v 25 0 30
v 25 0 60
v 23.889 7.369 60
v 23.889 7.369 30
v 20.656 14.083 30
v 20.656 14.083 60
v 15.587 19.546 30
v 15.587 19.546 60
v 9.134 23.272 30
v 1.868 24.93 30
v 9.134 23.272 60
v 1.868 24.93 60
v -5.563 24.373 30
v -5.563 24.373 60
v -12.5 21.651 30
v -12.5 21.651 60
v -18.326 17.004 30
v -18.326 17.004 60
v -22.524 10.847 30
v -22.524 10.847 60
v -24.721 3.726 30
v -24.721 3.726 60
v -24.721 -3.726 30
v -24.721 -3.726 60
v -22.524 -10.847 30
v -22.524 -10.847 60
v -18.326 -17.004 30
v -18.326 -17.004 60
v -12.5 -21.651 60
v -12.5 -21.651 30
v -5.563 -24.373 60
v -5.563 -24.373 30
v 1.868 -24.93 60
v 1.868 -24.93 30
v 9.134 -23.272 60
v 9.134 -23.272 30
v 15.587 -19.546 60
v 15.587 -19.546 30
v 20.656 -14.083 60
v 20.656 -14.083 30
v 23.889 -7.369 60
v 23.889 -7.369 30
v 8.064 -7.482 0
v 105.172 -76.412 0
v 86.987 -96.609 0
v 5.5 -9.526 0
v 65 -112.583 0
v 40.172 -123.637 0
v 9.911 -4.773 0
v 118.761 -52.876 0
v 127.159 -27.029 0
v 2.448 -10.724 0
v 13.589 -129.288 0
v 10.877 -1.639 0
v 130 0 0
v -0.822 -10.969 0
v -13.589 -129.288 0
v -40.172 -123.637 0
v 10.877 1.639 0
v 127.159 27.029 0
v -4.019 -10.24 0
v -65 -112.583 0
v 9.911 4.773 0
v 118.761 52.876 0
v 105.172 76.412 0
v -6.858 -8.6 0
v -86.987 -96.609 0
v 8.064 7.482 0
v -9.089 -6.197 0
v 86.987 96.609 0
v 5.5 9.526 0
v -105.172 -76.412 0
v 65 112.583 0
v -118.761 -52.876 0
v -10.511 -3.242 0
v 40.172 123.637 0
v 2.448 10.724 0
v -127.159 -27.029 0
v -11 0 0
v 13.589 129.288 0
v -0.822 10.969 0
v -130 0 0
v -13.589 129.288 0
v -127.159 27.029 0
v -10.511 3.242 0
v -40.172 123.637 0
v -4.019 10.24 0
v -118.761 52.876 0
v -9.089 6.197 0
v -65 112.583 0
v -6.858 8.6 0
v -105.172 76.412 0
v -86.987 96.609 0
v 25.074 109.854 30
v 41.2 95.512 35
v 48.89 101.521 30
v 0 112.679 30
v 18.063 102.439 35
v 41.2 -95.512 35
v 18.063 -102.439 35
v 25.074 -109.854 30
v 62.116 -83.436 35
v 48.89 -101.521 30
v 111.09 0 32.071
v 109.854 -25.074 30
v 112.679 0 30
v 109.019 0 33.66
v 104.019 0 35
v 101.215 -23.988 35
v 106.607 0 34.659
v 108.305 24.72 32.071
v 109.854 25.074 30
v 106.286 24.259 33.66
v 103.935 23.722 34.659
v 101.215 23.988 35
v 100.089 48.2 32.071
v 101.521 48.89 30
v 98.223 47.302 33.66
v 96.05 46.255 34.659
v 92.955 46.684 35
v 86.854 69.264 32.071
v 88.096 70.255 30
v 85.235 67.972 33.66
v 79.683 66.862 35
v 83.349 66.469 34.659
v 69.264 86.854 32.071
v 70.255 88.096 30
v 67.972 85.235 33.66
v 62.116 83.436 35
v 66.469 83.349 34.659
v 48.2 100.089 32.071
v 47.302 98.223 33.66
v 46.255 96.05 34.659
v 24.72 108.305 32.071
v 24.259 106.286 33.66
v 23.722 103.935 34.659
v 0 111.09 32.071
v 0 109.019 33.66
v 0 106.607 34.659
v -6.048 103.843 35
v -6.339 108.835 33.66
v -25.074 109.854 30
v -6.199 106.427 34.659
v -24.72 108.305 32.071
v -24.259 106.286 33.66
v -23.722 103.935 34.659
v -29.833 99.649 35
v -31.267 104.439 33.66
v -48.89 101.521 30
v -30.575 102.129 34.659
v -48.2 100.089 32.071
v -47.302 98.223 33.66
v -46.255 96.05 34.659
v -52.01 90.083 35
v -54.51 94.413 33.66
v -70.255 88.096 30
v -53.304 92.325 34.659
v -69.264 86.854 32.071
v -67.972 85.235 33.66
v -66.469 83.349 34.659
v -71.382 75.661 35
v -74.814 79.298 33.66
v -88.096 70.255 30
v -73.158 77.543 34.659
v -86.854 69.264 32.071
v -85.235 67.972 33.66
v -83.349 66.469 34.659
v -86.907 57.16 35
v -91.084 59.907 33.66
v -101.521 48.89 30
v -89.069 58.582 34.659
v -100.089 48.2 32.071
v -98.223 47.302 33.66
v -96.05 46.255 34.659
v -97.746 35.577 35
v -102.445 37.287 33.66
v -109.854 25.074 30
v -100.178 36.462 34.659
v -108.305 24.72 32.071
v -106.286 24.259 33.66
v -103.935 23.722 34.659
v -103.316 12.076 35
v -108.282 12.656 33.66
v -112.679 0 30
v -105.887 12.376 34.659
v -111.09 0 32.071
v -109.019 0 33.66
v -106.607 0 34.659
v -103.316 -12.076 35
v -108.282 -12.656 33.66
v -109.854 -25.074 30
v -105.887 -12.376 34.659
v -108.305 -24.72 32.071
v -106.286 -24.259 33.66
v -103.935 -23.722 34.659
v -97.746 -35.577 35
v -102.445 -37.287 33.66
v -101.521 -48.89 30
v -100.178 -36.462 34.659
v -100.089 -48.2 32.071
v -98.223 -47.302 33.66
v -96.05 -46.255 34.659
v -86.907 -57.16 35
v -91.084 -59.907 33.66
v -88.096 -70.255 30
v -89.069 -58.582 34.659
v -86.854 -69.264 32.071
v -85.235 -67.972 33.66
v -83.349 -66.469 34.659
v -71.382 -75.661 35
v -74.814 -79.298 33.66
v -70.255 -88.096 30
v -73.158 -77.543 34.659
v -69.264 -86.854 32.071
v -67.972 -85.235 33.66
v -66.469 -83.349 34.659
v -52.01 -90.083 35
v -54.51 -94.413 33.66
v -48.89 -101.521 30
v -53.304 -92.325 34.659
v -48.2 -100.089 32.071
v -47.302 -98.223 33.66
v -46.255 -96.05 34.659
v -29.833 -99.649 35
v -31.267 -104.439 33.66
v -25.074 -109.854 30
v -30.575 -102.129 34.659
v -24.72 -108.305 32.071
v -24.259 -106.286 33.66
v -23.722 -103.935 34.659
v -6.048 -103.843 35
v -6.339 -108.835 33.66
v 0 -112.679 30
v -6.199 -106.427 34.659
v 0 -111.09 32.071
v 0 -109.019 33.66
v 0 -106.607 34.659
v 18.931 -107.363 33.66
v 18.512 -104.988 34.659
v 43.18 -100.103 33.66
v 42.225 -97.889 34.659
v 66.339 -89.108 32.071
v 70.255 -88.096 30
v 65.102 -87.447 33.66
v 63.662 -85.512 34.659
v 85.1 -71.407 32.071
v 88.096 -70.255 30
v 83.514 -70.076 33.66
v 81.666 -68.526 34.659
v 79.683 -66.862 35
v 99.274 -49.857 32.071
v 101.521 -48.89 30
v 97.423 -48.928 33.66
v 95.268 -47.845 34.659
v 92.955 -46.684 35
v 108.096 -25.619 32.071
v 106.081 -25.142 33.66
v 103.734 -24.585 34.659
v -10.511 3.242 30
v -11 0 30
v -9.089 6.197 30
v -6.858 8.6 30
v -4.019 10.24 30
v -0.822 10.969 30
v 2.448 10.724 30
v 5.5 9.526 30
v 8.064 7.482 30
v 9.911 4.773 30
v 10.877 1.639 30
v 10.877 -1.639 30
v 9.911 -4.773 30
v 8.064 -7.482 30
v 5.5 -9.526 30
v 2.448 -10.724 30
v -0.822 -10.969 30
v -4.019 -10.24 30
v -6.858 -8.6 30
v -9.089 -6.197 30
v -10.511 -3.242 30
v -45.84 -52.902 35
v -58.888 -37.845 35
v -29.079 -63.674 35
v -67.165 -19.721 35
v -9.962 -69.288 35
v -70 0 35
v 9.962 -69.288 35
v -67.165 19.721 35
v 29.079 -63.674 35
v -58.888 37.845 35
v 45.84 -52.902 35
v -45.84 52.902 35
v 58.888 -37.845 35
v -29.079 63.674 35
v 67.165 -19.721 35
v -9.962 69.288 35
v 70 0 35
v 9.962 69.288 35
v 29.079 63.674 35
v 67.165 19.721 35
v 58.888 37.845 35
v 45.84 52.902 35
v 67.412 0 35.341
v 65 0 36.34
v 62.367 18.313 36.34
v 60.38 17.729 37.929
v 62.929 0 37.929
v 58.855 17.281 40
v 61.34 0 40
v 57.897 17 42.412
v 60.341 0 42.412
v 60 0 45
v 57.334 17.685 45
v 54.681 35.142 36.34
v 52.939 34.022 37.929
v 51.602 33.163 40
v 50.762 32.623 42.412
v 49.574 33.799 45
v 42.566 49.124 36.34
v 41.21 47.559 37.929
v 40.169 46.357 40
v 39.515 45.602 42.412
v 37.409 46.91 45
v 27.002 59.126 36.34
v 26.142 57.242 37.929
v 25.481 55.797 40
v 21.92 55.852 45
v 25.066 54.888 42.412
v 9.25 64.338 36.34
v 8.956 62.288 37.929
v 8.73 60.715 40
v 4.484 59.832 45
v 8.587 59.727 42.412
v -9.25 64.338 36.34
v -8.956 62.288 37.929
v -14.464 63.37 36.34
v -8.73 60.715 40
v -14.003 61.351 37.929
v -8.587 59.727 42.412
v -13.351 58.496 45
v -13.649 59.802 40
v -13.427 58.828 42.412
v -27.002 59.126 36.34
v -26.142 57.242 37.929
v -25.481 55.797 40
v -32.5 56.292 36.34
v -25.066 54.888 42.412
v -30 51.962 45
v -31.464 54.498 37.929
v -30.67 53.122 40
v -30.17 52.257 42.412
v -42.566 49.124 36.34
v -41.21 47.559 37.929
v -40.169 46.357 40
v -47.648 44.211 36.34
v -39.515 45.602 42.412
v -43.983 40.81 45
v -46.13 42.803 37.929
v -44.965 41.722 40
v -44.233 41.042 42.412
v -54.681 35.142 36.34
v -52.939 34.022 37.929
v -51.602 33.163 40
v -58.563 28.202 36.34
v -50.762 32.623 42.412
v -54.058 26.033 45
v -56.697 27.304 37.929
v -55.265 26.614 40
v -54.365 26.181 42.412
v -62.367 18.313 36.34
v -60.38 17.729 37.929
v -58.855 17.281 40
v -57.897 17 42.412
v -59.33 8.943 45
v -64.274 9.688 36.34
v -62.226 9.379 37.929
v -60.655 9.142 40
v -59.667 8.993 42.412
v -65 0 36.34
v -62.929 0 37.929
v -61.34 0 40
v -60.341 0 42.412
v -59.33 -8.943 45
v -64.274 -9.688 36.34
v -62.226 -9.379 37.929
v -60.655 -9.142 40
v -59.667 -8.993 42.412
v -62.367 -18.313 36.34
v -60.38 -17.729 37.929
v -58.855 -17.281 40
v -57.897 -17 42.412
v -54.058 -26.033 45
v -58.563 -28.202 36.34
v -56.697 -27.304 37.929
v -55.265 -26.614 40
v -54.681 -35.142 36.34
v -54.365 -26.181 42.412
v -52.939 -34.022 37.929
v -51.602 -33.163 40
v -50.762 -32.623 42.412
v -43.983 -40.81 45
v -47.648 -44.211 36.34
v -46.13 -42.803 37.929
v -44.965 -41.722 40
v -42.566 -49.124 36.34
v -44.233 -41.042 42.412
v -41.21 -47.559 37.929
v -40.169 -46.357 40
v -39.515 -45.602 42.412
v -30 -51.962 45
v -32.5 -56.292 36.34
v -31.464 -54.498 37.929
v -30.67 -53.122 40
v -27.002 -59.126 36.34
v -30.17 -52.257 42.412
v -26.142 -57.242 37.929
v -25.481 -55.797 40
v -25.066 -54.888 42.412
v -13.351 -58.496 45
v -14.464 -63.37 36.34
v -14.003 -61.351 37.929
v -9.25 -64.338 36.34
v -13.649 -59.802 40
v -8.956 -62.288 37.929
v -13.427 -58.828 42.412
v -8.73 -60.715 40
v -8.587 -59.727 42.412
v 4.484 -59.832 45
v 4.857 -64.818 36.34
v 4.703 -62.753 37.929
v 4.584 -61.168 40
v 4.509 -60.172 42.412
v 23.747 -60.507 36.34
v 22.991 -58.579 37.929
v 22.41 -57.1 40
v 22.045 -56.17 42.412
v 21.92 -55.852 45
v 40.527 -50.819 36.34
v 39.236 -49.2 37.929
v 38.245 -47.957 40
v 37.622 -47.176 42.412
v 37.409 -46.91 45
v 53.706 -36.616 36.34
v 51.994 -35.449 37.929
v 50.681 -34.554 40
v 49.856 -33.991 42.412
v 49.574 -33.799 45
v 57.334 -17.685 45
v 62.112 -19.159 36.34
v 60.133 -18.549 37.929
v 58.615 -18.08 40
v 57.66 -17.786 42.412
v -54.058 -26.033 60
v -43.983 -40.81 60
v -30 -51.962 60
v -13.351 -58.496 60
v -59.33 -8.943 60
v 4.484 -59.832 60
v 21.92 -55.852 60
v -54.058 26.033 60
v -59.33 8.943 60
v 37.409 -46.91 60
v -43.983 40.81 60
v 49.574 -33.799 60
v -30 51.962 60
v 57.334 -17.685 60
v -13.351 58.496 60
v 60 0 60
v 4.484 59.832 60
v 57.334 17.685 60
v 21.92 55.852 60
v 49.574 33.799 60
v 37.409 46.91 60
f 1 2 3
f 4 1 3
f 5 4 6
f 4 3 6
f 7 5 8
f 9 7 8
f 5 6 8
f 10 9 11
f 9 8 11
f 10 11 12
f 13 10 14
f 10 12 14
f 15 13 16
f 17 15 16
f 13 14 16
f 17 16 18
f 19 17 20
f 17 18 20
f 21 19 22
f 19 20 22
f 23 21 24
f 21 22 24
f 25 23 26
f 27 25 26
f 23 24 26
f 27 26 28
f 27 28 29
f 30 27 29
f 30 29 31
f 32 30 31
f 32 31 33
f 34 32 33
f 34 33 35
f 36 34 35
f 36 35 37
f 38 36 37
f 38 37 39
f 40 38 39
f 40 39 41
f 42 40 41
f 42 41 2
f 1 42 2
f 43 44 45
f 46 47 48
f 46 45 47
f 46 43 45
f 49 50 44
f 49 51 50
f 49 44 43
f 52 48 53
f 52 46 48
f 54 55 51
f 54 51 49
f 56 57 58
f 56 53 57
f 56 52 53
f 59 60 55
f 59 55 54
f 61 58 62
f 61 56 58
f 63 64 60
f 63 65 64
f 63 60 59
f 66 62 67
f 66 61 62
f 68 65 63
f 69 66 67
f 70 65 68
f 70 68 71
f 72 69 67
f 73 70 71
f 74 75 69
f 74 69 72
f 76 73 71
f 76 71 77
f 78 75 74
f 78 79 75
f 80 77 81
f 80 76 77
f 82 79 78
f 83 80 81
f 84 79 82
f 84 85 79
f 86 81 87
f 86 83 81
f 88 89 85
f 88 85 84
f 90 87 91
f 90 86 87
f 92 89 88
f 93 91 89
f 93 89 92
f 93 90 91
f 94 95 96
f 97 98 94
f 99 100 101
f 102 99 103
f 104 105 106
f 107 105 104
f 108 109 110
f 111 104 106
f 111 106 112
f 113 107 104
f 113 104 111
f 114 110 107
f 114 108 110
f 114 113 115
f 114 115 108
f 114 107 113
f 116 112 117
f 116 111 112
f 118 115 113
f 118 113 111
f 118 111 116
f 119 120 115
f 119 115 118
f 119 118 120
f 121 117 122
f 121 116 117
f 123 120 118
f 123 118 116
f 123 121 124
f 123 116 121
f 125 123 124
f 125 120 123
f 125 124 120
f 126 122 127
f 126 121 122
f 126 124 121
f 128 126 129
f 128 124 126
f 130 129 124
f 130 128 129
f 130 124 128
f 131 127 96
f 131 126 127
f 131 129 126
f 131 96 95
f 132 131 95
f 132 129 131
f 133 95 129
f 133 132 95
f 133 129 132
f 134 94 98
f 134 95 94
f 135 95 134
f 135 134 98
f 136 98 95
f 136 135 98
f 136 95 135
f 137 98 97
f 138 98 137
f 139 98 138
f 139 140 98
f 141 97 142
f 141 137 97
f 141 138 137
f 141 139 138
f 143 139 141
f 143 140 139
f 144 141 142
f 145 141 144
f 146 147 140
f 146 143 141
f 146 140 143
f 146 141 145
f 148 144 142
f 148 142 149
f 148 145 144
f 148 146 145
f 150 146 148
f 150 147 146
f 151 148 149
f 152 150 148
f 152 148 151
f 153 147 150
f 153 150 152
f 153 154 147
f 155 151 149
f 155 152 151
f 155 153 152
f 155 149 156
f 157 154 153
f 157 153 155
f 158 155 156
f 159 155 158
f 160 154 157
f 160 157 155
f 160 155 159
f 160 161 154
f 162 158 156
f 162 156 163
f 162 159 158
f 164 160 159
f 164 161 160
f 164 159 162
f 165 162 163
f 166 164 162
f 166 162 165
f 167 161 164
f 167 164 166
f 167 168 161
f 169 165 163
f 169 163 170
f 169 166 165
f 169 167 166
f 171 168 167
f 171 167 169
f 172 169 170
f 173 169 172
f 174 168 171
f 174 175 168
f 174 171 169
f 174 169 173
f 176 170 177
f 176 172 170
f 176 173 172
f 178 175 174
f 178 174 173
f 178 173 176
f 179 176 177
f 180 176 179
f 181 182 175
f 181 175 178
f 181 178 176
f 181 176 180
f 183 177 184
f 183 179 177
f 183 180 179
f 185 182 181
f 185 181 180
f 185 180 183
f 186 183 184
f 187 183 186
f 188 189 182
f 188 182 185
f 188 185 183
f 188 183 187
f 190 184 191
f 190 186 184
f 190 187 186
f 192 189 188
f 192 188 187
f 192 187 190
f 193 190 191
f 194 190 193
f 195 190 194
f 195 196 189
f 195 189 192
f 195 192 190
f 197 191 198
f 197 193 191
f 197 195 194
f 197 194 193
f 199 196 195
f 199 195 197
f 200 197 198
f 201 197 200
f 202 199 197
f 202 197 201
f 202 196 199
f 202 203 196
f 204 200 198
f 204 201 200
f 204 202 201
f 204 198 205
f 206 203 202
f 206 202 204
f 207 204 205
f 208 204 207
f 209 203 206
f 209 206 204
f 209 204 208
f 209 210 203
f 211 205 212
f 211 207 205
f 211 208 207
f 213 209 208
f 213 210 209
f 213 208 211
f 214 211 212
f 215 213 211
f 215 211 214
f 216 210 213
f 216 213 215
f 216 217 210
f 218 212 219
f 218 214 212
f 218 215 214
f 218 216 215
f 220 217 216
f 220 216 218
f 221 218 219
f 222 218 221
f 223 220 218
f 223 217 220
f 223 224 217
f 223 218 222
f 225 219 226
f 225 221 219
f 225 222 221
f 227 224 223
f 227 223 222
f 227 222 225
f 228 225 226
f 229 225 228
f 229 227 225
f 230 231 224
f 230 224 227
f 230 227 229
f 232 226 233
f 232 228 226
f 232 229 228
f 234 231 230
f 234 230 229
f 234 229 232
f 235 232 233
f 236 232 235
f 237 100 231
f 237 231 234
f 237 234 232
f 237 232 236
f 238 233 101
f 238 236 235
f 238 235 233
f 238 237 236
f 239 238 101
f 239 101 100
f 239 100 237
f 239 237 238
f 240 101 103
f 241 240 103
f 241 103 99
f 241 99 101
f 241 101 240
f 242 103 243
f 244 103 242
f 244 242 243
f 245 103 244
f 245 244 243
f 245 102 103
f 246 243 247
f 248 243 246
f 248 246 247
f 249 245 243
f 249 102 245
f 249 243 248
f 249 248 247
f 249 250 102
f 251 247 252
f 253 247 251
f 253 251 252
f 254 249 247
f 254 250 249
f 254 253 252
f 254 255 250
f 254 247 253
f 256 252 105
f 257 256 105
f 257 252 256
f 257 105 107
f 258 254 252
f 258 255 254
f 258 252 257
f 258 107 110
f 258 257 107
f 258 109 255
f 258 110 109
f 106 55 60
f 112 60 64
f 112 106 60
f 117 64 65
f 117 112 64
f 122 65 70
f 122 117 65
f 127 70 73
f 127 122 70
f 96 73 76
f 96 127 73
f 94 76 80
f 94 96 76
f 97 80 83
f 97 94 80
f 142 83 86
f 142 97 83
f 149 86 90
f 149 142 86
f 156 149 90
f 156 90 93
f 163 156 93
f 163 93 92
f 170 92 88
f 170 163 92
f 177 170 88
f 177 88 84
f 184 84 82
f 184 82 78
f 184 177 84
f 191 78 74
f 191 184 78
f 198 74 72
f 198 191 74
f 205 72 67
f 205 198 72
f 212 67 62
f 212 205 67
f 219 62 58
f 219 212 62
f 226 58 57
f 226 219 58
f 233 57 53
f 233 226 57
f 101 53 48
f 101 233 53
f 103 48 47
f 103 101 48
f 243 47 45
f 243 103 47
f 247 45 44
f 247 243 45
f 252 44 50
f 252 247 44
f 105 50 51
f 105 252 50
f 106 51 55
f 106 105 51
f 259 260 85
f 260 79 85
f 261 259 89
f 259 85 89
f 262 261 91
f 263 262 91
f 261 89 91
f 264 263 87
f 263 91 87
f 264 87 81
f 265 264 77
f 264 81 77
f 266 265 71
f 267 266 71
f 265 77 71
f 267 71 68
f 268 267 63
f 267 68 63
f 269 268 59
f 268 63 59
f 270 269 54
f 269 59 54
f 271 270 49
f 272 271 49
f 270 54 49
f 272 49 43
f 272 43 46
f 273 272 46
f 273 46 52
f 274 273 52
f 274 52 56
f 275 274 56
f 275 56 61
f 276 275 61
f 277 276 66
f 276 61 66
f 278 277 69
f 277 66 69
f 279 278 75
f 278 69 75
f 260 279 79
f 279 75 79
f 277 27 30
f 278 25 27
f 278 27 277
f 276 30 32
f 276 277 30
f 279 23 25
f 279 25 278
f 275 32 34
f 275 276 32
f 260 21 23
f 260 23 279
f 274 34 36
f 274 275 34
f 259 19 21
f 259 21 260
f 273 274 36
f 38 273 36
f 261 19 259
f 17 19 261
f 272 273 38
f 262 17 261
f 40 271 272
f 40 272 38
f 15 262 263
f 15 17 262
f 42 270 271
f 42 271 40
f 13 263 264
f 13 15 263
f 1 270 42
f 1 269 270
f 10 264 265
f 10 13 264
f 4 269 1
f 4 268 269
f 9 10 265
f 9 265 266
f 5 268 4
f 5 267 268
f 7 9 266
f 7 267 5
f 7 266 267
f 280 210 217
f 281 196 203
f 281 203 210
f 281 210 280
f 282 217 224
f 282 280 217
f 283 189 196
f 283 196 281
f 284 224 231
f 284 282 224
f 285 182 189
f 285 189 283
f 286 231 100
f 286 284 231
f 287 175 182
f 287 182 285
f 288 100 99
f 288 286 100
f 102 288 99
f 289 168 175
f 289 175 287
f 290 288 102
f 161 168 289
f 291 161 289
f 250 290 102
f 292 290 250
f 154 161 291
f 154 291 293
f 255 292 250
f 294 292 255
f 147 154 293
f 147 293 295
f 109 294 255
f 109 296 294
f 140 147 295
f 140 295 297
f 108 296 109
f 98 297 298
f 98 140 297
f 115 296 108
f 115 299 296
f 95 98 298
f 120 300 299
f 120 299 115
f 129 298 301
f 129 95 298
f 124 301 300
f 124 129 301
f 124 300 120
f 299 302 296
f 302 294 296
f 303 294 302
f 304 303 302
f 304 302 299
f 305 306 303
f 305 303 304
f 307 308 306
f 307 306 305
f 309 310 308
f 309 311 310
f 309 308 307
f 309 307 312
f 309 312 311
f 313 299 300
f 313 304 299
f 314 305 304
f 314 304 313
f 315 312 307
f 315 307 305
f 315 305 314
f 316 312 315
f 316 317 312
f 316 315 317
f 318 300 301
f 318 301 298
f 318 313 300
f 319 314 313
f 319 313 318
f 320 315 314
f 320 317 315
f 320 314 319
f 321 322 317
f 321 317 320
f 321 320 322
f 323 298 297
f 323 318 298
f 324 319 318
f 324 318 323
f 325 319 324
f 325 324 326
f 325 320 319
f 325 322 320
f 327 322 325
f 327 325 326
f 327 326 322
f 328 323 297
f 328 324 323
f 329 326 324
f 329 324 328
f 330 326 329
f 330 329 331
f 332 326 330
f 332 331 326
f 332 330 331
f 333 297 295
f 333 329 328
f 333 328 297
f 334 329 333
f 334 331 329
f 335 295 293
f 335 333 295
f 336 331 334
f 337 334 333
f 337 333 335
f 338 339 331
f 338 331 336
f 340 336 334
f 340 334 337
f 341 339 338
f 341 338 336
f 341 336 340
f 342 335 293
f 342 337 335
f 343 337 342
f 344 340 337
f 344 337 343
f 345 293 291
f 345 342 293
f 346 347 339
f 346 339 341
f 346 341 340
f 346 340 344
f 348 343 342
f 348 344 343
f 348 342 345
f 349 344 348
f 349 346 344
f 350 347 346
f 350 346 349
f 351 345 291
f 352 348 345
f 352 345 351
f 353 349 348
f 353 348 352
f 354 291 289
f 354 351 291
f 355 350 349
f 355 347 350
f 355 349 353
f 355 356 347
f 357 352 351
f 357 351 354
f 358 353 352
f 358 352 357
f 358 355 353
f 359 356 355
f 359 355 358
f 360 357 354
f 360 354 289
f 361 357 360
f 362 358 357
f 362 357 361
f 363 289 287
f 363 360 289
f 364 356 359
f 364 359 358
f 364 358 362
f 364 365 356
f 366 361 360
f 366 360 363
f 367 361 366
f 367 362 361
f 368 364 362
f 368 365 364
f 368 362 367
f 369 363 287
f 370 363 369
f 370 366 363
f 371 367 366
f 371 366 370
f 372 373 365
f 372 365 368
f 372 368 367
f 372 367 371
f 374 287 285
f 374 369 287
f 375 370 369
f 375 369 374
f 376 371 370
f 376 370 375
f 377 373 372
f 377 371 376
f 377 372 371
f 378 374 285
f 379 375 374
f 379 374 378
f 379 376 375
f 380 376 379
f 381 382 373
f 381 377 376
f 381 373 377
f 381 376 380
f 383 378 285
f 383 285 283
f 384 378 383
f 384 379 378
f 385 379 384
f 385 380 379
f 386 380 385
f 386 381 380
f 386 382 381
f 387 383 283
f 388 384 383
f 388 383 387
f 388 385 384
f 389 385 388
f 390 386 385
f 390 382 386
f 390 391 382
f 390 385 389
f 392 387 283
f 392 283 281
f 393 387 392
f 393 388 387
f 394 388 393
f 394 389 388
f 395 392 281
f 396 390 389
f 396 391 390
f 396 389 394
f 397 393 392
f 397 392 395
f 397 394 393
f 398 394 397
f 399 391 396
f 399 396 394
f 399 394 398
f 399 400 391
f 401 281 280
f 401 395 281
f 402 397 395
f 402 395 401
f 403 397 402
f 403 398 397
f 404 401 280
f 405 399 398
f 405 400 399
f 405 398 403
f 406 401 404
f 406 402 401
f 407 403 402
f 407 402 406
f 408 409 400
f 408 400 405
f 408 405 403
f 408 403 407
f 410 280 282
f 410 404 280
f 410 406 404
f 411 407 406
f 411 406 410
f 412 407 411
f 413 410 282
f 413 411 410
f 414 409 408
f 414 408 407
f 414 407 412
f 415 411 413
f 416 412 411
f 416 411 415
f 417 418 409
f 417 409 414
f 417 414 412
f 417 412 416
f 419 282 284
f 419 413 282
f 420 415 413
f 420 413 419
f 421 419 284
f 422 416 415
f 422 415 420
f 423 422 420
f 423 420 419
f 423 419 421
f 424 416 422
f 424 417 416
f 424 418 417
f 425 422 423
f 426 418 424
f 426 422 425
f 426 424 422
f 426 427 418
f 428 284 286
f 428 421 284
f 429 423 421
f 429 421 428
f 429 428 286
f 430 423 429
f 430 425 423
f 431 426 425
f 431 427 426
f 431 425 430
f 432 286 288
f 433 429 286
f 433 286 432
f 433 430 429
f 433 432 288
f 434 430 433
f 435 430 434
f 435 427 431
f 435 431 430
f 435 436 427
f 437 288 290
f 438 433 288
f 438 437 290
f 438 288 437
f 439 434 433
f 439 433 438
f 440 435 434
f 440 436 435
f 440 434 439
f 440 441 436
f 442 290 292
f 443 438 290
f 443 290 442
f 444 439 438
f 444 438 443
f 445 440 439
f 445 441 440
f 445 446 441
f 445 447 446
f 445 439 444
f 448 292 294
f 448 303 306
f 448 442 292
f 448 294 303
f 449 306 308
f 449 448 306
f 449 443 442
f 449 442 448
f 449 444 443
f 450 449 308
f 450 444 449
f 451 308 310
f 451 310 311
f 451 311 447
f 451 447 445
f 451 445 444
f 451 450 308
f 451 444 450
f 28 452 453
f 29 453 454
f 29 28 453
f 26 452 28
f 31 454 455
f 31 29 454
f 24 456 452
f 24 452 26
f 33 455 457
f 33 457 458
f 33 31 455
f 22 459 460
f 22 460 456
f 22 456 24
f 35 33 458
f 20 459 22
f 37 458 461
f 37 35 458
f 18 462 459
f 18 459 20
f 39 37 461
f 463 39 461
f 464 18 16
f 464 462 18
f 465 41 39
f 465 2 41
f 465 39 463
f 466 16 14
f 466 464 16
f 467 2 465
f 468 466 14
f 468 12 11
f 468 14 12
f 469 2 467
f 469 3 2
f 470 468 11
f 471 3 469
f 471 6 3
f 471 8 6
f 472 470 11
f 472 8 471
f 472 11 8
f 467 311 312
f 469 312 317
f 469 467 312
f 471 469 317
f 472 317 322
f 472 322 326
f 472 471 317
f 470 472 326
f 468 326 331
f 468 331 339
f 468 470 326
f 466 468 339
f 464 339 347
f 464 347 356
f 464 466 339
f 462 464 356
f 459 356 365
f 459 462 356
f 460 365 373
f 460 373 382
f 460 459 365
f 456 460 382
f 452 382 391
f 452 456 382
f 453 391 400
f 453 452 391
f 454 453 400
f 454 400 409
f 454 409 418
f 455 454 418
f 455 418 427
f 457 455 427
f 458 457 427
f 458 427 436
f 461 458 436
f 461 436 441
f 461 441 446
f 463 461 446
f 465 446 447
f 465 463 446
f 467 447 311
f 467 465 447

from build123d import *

# Parameters (mm, degrees)
F3_D           = 22
F3_CBORE_D     = 50
F3_CBORE_DEPTH = 30
F4_R           = 10


with BuildPart() as f1:
    # F0 (on Front) → F1 (revolve)
    with BuildSketch(Plane.XZ):
        Polygon((0, 60), (0, 0), (130, 0), (109.792741, 35), (60, 35), (60, 60), align=None)
    revolve(axis=Axis((0, 0, 30), (0, 0, 1)))

    # F3 (through all)
    with Locations(Plane.XY.offset(60)):
        with Locations((0, 0)):
            CounterBoreHole(F3_D / 2, F3_CBORE_D / 2, F3_CBORE_DEPTH)

    # F4
    f4_edges = [f1.edges().sort_by_distance(p)[0] for p in [
        (-60, 0, 35),
        (-109.792741, 0, 35),
    ]]
    fillet(f4_edges, radius=F4_R)


solid = f1.part
